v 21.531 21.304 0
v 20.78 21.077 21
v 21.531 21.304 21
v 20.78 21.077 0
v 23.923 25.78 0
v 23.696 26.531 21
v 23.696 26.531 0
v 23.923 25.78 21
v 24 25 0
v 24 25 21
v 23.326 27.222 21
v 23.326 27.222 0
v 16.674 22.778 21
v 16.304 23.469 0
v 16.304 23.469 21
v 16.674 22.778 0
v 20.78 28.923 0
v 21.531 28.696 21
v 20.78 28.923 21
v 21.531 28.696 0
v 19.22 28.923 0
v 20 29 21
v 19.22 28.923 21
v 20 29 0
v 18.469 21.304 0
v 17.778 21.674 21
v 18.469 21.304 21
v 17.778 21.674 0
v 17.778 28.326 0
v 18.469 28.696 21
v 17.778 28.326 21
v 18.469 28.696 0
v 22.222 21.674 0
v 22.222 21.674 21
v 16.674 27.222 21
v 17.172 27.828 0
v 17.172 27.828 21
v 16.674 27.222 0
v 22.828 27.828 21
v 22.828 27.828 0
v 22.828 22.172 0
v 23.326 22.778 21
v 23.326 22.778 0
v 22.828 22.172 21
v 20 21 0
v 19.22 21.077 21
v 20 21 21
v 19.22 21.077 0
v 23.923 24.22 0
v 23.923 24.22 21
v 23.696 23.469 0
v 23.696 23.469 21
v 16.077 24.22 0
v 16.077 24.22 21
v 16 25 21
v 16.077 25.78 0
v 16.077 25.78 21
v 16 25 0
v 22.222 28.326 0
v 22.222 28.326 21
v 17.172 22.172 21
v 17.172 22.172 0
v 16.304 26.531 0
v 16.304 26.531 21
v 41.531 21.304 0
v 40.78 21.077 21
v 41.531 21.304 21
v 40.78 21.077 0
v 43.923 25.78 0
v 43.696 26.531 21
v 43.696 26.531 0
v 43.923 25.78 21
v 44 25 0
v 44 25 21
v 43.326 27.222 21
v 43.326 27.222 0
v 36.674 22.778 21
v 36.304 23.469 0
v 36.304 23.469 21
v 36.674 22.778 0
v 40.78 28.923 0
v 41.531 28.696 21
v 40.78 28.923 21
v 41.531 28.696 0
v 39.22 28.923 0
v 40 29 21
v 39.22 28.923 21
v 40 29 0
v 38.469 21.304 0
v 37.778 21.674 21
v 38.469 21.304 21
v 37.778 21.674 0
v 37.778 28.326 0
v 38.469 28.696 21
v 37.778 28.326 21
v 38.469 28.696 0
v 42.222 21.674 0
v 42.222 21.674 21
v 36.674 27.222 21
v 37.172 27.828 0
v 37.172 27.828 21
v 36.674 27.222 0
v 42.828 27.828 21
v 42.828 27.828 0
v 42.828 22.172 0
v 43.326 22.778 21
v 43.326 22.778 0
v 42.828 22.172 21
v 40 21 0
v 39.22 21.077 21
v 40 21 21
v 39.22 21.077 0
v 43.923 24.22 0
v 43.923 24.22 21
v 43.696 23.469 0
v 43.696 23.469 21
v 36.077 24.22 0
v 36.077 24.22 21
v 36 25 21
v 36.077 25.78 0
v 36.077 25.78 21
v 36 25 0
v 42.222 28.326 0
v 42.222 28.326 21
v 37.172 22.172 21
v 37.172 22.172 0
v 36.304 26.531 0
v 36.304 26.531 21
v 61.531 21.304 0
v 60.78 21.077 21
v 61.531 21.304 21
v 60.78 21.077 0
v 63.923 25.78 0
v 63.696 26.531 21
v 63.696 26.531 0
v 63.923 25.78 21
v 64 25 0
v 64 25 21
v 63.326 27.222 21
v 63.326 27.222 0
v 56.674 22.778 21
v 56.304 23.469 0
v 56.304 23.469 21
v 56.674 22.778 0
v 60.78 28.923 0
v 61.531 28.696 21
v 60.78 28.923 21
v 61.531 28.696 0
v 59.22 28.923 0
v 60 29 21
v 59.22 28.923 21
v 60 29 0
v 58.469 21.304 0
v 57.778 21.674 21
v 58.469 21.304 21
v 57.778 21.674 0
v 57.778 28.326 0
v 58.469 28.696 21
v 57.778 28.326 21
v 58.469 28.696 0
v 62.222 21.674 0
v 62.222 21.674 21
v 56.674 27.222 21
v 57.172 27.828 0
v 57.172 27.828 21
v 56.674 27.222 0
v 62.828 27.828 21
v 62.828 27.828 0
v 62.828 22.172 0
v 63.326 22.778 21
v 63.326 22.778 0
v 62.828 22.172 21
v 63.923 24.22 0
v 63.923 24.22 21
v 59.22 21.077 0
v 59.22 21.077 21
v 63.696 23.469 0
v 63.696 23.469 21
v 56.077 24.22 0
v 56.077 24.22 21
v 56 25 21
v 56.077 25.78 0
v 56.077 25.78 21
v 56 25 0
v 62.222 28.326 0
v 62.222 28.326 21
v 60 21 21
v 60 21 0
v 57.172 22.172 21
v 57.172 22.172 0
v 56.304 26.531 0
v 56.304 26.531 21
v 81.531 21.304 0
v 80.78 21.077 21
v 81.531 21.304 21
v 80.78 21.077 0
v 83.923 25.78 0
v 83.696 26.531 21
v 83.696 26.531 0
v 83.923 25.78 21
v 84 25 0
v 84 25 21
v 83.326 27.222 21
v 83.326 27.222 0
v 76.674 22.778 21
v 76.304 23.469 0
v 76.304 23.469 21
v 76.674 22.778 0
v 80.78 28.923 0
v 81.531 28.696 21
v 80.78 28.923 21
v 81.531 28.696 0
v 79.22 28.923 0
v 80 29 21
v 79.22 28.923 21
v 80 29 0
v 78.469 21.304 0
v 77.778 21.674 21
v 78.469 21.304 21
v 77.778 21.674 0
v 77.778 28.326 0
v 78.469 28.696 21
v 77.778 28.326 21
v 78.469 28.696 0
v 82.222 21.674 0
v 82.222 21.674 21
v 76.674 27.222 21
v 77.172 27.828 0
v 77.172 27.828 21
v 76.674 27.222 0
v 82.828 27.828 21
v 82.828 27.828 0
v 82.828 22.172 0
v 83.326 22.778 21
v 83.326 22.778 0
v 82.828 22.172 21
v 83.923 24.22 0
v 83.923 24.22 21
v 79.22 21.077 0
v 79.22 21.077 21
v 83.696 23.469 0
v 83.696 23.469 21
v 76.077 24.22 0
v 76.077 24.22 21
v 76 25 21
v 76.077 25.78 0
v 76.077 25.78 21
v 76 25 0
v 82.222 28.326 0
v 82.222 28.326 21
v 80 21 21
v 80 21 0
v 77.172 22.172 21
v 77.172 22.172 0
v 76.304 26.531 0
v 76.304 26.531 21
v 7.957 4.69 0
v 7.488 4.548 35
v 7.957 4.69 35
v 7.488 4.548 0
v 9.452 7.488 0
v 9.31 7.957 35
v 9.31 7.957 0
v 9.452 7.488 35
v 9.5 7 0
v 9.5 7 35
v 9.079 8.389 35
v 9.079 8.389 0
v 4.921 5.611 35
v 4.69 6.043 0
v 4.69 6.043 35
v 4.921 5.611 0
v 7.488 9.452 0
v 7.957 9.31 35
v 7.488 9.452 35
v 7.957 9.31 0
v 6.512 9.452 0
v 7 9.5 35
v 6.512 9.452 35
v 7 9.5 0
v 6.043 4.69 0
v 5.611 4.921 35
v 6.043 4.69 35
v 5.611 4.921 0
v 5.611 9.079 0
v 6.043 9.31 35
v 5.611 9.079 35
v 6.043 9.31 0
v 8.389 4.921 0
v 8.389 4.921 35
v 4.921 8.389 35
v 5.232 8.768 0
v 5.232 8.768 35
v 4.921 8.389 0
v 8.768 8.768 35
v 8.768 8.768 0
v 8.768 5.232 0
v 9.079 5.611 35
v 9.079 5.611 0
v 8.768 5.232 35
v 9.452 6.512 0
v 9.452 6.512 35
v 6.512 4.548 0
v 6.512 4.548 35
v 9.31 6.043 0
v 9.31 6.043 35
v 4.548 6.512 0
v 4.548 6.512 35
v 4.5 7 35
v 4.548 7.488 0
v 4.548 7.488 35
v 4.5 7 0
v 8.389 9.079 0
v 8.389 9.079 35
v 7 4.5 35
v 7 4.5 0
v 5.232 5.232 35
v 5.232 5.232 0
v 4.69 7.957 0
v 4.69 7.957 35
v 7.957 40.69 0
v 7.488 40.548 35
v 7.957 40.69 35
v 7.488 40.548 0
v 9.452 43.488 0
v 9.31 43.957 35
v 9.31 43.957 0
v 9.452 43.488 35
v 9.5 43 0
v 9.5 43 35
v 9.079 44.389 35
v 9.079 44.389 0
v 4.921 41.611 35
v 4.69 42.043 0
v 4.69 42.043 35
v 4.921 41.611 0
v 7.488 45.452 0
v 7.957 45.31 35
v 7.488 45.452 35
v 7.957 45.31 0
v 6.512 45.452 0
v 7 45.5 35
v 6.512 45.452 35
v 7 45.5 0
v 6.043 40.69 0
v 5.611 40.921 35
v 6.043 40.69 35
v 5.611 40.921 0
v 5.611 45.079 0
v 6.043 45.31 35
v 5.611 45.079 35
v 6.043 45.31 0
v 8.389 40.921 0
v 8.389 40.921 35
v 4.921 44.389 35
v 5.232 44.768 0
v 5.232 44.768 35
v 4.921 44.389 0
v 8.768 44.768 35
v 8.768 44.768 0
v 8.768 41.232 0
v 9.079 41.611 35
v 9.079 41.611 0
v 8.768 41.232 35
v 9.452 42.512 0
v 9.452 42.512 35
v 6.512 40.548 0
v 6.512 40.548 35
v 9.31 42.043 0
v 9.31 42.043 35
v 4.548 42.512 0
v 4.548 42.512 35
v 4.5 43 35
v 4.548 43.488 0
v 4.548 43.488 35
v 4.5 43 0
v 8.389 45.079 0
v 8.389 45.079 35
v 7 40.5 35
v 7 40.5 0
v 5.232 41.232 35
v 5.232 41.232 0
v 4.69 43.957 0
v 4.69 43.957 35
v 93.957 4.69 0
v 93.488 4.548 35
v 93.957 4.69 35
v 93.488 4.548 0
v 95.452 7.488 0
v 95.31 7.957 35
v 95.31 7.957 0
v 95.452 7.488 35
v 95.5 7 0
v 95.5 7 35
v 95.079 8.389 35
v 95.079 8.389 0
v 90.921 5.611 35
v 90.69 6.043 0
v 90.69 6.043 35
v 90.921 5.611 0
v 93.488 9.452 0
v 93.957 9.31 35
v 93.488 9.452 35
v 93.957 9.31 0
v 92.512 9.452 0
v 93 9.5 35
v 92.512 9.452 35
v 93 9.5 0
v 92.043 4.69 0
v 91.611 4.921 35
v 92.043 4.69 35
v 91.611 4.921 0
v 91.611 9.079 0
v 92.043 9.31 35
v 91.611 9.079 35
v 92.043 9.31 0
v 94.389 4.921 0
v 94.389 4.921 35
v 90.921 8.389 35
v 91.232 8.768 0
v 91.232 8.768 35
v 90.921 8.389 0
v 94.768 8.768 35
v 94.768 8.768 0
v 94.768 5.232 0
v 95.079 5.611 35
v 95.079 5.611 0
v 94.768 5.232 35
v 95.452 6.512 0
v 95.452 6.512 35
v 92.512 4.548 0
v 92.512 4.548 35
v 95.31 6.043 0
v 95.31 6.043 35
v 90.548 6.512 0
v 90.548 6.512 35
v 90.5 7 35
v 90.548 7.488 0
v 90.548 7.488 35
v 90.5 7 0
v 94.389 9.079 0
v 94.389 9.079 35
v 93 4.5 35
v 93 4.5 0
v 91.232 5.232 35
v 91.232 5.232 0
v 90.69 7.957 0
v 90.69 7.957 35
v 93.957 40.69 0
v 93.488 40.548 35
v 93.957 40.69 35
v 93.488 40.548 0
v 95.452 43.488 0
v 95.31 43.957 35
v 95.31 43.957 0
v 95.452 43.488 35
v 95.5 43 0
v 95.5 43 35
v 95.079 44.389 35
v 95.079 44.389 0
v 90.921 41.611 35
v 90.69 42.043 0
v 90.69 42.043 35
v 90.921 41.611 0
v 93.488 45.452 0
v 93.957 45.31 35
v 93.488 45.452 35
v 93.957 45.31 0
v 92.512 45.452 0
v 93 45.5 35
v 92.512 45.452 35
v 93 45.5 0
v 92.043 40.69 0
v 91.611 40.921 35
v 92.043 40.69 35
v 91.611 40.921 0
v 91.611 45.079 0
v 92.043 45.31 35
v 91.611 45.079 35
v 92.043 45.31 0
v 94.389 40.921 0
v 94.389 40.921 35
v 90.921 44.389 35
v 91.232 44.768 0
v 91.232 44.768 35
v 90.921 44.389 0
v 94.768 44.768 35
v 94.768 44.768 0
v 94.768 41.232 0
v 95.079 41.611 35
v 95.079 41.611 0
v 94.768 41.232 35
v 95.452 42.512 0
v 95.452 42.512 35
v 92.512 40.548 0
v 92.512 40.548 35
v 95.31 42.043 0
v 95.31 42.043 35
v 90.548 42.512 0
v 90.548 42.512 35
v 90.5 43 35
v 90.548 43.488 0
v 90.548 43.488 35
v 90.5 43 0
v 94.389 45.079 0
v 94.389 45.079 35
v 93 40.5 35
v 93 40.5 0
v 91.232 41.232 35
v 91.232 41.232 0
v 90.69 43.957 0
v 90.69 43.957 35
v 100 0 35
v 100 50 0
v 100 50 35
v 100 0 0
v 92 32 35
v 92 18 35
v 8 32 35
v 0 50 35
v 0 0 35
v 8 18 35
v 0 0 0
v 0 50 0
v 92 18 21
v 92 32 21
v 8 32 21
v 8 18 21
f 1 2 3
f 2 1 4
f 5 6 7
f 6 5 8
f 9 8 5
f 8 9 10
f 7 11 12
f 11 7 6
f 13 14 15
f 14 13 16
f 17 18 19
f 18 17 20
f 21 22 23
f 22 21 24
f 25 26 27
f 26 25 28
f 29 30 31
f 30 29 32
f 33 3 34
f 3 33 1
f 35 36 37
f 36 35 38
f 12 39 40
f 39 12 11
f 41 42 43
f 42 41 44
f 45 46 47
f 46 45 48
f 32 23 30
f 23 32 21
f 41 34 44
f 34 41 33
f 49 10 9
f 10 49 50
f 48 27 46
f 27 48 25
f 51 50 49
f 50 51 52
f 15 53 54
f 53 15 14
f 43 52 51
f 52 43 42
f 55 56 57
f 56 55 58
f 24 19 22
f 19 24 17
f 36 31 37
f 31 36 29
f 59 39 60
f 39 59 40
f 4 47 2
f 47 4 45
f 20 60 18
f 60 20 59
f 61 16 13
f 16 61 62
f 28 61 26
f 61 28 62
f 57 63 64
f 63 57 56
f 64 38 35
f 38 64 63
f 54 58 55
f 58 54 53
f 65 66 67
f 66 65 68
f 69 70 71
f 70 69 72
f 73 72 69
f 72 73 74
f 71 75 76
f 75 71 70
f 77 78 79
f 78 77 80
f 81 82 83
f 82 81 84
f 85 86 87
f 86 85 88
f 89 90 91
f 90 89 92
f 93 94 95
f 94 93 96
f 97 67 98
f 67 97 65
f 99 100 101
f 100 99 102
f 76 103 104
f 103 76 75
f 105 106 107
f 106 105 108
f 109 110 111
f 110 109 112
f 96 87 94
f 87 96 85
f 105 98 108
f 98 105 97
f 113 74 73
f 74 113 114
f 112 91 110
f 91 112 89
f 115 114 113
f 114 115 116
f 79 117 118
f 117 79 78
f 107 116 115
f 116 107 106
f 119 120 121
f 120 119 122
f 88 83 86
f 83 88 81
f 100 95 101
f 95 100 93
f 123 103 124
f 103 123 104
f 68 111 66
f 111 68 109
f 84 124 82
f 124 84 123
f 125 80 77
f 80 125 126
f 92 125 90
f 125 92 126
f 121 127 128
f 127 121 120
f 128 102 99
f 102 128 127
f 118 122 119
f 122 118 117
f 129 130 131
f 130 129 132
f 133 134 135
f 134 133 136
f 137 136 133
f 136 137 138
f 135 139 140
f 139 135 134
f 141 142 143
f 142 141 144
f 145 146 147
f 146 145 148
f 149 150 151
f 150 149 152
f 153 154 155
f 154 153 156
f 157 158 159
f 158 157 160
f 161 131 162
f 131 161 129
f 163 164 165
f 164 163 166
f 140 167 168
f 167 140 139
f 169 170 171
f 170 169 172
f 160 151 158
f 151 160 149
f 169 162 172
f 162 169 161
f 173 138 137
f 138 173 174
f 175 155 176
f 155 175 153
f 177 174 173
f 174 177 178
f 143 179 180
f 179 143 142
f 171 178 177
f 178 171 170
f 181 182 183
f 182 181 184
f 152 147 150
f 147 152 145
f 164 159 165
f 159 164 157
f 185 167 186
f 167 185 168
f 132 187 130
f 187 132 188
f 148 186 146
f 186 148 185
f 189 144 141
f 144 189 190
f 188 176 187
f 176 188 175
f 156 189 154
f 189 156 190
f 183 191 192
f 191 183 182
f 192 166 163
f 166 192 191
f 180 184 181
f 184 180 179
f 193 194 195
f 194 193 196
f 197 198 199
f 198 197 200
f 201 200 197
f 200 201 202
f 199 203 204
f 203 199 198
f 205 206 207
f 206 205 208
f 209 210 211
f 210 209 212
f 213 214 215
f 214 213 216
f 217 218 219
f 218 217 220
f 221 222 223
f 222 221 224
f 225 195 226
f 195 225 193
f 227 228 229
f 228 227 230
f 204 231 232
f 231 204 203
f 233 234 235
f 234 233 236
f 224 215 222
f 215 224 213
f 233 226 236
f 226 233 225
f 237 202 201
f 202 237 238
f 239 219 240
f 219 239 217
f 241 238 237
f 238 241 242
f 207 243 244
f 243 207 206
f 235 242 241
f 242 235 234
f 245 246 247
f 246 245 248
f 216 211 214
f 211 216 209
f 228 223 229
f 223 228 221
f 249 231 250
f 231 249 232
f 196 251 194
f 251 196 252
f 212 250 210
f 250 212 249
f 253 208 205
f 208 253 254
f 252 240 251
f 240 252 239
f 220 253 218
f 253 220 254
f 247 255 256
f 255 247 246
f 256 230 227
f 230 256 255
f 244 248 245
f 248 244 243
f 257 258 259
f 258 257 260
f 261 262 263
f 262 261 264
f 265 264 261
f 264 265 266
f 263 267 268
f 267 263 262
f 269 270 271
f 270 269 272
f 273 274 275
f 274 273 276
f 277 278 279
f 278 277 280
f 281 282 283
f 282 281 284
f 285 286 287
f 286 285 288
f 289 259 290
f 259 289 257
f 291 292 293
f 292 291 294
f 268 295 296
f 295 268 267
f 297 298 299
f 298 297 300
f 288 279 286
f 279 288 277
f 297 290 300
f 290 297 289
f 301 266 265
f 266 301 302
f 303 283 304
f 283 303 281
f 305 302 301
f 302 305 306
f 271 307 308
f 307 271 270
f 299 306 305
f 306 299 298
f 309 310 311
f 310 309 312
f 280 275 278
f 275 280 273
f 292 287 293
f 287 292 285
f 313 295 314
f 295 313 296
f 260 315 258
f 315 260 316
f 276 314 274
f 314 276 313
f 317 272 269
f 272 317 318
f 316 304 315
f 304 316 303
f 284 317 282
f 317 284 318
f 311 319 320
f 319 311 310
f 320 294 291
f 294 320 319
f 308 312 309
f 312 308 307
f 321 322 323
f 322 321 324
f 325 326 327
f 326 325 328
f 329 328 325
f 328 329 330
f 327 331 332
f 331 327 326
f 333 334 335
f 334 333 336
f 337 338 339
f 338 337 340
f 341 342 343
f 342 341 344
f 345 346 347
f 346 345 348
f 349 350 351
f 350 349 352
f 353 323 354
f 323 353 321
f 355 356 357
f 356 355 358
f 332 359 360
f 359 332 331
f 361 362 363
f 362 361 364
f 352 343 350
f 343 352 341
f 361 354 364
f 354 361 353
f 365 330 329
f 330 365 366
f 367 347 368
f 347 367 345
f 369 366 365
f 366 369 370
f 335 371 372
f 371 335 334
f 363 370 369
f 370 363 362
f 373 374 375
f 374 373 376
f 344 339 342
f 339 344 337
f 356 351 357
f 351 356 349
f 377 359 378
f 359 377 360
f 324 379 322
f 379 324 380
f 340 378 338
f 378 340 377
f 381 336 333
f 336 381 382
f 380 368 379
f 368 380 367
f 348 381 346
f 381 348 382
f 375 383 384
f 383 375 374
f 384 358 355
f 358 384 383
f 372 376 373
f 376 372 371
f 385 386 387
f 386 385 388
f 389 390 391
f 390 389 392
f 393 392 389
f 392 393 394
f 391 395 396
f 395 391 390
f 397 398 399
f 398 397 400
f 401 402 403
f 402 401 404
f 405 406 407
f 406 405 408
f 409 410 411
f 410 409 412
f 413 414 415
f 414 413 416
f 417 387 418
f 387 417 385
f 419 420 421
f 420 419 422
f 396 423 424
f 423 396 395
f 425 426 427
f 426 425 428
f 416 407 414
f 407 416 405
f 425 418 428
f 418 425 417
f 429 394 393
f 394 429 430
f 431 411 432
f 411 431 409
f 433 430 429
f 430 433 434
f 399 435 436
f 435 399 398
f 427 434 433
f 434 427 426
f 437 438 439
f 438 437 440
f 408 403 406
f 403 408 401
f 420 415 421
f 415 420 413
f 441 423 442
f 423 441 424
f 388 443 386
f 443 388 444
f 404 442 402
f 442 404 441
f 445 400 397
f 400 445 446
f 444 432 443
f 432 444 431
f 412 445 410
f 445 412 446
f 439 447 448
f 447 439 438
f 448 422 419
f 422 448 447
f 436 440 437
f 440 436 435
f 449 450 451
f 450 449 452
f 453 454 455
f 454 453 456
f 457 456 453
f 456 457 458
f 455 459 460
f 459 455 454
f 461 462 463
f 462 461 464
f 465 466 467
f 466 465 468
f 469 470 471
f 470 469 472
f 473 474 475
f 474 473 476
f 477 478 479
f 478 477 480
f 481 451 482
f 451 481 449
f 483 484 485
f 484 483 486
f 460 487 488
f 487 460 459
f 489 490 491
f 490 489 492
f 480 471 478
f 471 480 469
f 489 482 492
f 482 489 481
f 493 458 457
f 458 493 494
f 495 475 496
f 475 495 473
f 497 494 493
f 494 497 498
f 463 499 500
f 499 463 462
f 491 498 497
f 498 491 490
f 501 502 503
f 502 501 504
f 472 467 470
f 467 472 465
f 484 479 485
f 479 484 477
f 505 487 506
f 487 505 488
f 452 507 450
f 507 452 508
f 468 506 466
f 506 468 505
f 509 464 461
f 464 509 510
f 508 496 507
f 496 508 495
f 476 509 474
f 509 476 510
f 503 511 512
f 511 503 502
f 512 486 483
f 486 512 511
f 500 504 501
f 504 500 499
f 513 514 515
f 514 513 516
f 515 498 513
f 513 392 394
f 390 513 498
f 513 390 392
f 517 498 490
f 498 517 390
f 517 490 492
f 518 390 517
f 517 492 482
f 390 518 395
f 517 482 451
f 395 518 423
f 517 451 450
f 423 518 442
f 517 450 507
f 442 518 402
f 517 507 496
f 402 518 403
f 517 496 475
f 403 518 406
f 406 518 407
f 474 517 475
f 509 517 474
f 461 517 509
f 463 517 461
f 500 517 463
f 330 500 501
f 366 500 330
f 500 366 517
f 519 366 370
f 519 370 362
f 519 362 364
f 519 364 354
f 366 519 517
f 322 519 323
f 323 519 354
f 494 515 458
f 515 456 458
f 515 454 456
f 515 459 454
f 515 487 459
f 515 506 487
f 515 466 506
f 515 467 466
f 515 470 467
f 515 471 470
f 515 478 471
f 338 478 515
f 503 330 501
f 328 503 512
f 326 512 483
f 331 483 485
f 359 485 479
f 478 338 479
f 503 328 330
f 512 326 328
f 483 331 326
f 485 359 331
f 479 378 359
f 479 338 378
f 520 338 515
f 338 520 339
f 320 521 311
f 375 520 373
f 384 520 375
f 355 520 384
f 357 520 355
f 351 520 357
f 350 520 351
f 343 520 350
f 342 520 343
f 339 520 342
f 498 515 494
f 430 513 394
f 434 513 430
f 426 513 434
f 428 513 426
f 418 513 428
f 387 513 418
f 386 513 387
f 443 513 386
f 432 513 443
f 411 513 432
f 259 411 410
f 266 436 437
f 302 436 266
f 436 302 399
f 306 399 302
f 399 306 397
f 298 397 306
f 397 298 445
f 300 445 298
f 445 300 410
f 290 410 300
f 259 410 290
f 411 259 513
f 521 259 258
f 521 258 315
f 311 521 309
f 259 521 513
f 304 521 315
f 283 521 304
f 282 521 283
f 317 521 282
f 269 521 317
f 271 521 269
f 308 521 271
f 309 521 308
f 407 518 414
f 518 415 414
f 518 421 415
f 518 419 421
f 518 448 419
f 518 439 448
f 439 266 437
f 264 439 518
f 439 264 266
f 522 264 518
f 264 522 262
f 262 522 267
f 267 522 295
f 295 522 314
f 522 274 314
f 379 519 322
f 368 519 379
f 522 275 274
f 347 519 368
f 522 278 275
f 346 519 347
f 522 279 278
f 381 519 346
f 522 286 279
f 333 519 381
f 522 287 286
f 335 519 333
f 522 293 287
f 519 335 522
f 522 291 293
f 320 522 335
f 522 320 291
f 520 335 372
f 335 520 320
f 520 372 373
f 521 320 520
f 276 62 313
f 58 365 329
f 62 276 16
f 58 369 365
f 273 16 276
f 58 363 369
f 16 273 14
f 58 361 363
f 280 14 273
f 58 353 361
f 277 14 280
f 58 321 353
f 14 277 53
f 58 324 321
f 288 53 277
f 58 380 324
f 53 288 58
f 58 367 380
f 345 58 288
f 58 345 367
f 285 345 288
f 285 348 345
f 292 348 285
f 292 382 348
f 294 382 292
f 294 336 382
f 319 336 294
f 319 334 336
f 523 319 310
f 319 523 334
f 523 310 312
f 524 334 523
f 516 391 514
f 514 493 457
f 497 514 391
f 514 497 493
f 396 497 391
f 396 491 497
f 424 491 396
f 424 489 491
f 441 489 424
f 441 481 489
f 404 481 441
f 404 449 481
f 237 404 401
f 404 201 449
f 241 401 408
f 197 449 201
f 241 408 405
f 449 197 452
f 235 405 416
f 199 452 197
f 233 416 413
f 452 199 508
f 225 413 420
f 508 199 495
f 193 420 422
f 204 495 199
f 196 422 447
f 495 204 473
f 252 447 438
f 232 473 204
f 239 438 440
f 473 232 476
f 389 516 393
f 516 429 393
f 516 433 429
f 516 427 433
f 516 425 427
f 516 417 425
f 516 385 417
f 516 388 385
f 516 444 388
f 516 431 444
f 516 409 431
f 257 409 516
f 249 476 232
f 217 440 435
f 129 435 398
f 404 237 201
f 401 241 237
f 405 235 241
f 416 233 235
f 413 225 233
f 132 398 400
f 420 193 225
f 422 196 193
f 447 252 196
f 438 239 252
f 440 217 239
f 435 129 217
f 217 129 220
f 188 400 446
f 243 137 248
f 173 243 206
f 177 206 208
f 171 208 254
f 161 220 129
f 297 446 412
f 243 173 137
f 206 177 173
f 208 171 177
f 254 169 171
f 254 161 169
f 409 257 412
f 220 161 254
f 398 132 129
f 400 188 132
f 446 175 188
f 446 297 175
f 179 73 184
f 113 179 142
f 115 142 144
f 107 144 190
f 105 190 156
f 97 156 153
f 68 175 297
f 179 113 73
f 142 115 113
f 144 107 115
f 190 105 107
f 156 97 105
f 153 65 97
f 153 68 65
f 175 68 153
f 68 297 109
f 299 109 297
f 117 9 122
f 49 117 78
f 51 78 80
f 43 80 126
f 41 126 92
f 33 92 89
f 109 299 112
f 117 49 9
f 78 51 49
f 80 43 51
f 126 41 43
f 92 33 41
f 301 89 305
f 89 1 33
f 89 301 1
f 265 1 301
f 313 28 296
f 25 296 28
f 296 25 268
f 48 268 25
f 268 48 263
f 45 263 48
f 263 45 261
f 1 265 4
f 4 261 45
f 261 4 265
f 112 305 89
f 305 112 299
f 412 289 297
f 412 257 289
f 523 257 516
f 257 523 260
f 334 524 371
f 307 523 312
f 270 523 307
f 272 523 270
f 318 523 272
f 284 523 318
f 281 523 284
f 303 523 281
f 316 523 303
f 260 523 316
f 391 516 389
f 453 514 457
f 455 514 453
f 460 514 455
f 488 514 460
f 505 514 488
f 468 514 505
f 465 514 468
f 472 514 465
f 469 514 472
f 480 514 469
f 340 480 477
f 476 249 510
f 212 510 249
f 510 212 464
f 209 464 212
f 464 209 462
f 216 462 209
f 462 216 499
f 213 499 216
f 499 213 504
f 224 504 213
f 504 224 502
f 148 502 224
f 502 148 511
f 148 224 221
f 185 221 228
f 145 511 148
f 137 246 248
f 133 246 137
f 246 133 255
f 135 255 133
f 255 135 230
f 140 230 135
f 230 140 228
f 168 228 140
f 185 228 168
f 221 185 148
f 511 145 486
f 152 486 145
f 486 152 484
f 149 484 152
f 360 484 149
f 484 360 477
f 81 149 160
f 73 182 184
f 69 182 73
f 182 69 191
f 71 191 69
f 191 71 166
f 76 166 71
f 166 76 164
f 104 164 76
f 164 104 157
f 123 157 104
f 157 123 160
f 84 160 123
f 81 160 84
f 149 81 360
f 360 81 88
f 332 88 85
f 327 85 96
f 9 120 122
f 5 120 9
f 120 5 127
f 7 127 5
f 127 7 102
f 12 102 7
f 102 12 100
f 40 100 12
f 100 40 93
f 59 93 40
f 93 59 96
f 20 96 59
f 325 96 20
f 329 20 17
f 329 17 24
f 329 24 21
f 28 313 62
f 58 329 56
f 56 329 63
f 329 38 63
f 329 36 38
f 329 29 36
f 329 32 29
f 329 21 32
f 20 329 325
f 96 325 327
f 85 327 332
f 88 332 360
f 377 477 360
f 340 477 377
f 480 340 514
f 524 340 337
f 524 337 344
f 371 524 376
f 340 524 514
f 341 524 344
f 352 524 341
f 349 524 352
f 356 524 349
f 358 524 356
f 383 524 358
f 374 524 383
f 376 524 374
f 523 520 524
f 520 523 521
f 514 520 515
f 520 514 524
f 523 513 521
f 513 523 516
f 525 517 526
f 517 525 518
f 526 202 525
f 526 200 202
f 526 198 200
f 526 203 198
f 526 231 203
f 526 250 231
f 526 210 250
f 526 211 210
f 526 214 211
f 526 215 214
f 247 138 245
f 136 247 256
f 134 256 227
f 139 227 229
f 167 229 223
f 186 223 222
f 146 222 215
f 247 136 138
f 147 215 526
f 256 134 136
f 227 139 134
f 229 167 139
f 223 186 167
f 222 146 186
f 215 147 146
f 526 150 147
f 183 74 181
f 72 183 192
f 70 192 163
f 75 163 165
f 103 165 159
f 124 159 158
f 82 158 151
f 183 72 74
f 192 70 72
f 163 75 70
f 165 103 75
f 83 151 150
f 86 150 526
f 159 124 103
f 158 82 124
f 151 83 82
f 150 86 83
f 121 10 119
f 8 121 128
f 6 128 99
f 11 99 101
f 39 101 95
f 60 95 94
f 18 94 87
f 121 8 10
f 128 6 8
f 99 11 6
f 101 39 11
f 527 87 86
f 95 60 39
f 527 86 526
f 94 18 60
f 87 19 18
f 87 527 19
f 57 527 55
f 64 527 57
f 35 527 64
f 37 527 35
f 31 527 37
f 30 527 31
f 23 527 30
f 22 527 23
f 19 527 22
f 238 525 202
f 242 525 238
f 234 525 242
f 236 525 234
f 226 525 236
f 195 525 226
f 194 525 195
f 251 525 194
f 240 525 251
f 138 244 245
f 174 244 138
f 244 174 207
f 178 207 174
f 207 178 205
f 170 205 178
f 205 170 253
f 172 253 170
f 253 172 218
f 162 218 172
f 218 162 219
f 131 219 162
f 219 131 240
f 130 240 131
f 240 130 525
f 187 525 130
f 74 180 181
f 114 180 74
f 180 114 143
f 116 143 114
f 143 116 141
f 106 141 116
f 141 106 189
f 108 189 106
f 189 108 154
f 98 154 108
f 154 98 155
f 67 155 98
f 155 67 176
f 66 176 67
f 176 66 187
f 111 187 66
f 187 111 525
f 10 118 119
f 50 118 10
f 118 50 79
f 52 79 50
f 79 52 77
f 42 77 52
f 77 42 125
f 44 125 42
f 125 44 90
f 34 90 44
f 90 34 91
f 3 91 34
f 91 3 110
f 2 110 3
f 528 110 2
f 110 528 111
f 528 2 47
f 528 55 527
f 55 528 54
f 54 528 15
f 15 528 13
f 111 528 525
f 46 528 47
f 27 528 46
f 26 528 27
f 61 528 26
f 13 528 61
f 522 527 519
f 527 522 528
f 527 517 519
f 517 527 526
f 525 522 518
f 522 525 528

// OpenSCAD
$fn = 32;

// ----------------------------------------------------------------------
// Manifold block: gallery_top manifold
// ----------------------------------------------------------------------

// --- parameters (mm) ---
block_l = 100;            // block length, X
block_w = 50;             // block width, Y
block_h = 35;             // block height, Z
port_d = 8;               // port bore diameter
port_pitch = 20;          // port pitch along X
gallery_d = 14;           // top gallery width, Y
gallery_depth = 14;       // gallery pocket depth
wall_p = 8;               // gallery end wall thickness, X
mnt_d = 5;                // mounting hole diameter
mnt_in = 7;               // mounting hole inset from the edges

n_ports = 4;  // ports in the row
port_x0 = (block_l - (n_ports - 1) * port_pitch) / 2;  // first port X

difference() {
  cube([block_l, block_w, block_h]);
  for (i = [0 : n_ports - 1])
    translate([port_x0 + i * port_pitch, block_w / 2, -1])
      cylinder(h = block_h + 2, d = port_d);
  translate([wall_p, block_w / 2 - gallery_d / 2, block_h - gallery_depth])
    cube([block_l - 2 * wall_p, gallery_d, gallery_depth + 1]);
  for (cx = [mnt_in, block_l - mnt_in])
    for (cy = [mnt_in, block_w - mnt_in])
      translate([cx, cy, -1]) cylinder(h = block_h + 2, d = mnt_d);
}
